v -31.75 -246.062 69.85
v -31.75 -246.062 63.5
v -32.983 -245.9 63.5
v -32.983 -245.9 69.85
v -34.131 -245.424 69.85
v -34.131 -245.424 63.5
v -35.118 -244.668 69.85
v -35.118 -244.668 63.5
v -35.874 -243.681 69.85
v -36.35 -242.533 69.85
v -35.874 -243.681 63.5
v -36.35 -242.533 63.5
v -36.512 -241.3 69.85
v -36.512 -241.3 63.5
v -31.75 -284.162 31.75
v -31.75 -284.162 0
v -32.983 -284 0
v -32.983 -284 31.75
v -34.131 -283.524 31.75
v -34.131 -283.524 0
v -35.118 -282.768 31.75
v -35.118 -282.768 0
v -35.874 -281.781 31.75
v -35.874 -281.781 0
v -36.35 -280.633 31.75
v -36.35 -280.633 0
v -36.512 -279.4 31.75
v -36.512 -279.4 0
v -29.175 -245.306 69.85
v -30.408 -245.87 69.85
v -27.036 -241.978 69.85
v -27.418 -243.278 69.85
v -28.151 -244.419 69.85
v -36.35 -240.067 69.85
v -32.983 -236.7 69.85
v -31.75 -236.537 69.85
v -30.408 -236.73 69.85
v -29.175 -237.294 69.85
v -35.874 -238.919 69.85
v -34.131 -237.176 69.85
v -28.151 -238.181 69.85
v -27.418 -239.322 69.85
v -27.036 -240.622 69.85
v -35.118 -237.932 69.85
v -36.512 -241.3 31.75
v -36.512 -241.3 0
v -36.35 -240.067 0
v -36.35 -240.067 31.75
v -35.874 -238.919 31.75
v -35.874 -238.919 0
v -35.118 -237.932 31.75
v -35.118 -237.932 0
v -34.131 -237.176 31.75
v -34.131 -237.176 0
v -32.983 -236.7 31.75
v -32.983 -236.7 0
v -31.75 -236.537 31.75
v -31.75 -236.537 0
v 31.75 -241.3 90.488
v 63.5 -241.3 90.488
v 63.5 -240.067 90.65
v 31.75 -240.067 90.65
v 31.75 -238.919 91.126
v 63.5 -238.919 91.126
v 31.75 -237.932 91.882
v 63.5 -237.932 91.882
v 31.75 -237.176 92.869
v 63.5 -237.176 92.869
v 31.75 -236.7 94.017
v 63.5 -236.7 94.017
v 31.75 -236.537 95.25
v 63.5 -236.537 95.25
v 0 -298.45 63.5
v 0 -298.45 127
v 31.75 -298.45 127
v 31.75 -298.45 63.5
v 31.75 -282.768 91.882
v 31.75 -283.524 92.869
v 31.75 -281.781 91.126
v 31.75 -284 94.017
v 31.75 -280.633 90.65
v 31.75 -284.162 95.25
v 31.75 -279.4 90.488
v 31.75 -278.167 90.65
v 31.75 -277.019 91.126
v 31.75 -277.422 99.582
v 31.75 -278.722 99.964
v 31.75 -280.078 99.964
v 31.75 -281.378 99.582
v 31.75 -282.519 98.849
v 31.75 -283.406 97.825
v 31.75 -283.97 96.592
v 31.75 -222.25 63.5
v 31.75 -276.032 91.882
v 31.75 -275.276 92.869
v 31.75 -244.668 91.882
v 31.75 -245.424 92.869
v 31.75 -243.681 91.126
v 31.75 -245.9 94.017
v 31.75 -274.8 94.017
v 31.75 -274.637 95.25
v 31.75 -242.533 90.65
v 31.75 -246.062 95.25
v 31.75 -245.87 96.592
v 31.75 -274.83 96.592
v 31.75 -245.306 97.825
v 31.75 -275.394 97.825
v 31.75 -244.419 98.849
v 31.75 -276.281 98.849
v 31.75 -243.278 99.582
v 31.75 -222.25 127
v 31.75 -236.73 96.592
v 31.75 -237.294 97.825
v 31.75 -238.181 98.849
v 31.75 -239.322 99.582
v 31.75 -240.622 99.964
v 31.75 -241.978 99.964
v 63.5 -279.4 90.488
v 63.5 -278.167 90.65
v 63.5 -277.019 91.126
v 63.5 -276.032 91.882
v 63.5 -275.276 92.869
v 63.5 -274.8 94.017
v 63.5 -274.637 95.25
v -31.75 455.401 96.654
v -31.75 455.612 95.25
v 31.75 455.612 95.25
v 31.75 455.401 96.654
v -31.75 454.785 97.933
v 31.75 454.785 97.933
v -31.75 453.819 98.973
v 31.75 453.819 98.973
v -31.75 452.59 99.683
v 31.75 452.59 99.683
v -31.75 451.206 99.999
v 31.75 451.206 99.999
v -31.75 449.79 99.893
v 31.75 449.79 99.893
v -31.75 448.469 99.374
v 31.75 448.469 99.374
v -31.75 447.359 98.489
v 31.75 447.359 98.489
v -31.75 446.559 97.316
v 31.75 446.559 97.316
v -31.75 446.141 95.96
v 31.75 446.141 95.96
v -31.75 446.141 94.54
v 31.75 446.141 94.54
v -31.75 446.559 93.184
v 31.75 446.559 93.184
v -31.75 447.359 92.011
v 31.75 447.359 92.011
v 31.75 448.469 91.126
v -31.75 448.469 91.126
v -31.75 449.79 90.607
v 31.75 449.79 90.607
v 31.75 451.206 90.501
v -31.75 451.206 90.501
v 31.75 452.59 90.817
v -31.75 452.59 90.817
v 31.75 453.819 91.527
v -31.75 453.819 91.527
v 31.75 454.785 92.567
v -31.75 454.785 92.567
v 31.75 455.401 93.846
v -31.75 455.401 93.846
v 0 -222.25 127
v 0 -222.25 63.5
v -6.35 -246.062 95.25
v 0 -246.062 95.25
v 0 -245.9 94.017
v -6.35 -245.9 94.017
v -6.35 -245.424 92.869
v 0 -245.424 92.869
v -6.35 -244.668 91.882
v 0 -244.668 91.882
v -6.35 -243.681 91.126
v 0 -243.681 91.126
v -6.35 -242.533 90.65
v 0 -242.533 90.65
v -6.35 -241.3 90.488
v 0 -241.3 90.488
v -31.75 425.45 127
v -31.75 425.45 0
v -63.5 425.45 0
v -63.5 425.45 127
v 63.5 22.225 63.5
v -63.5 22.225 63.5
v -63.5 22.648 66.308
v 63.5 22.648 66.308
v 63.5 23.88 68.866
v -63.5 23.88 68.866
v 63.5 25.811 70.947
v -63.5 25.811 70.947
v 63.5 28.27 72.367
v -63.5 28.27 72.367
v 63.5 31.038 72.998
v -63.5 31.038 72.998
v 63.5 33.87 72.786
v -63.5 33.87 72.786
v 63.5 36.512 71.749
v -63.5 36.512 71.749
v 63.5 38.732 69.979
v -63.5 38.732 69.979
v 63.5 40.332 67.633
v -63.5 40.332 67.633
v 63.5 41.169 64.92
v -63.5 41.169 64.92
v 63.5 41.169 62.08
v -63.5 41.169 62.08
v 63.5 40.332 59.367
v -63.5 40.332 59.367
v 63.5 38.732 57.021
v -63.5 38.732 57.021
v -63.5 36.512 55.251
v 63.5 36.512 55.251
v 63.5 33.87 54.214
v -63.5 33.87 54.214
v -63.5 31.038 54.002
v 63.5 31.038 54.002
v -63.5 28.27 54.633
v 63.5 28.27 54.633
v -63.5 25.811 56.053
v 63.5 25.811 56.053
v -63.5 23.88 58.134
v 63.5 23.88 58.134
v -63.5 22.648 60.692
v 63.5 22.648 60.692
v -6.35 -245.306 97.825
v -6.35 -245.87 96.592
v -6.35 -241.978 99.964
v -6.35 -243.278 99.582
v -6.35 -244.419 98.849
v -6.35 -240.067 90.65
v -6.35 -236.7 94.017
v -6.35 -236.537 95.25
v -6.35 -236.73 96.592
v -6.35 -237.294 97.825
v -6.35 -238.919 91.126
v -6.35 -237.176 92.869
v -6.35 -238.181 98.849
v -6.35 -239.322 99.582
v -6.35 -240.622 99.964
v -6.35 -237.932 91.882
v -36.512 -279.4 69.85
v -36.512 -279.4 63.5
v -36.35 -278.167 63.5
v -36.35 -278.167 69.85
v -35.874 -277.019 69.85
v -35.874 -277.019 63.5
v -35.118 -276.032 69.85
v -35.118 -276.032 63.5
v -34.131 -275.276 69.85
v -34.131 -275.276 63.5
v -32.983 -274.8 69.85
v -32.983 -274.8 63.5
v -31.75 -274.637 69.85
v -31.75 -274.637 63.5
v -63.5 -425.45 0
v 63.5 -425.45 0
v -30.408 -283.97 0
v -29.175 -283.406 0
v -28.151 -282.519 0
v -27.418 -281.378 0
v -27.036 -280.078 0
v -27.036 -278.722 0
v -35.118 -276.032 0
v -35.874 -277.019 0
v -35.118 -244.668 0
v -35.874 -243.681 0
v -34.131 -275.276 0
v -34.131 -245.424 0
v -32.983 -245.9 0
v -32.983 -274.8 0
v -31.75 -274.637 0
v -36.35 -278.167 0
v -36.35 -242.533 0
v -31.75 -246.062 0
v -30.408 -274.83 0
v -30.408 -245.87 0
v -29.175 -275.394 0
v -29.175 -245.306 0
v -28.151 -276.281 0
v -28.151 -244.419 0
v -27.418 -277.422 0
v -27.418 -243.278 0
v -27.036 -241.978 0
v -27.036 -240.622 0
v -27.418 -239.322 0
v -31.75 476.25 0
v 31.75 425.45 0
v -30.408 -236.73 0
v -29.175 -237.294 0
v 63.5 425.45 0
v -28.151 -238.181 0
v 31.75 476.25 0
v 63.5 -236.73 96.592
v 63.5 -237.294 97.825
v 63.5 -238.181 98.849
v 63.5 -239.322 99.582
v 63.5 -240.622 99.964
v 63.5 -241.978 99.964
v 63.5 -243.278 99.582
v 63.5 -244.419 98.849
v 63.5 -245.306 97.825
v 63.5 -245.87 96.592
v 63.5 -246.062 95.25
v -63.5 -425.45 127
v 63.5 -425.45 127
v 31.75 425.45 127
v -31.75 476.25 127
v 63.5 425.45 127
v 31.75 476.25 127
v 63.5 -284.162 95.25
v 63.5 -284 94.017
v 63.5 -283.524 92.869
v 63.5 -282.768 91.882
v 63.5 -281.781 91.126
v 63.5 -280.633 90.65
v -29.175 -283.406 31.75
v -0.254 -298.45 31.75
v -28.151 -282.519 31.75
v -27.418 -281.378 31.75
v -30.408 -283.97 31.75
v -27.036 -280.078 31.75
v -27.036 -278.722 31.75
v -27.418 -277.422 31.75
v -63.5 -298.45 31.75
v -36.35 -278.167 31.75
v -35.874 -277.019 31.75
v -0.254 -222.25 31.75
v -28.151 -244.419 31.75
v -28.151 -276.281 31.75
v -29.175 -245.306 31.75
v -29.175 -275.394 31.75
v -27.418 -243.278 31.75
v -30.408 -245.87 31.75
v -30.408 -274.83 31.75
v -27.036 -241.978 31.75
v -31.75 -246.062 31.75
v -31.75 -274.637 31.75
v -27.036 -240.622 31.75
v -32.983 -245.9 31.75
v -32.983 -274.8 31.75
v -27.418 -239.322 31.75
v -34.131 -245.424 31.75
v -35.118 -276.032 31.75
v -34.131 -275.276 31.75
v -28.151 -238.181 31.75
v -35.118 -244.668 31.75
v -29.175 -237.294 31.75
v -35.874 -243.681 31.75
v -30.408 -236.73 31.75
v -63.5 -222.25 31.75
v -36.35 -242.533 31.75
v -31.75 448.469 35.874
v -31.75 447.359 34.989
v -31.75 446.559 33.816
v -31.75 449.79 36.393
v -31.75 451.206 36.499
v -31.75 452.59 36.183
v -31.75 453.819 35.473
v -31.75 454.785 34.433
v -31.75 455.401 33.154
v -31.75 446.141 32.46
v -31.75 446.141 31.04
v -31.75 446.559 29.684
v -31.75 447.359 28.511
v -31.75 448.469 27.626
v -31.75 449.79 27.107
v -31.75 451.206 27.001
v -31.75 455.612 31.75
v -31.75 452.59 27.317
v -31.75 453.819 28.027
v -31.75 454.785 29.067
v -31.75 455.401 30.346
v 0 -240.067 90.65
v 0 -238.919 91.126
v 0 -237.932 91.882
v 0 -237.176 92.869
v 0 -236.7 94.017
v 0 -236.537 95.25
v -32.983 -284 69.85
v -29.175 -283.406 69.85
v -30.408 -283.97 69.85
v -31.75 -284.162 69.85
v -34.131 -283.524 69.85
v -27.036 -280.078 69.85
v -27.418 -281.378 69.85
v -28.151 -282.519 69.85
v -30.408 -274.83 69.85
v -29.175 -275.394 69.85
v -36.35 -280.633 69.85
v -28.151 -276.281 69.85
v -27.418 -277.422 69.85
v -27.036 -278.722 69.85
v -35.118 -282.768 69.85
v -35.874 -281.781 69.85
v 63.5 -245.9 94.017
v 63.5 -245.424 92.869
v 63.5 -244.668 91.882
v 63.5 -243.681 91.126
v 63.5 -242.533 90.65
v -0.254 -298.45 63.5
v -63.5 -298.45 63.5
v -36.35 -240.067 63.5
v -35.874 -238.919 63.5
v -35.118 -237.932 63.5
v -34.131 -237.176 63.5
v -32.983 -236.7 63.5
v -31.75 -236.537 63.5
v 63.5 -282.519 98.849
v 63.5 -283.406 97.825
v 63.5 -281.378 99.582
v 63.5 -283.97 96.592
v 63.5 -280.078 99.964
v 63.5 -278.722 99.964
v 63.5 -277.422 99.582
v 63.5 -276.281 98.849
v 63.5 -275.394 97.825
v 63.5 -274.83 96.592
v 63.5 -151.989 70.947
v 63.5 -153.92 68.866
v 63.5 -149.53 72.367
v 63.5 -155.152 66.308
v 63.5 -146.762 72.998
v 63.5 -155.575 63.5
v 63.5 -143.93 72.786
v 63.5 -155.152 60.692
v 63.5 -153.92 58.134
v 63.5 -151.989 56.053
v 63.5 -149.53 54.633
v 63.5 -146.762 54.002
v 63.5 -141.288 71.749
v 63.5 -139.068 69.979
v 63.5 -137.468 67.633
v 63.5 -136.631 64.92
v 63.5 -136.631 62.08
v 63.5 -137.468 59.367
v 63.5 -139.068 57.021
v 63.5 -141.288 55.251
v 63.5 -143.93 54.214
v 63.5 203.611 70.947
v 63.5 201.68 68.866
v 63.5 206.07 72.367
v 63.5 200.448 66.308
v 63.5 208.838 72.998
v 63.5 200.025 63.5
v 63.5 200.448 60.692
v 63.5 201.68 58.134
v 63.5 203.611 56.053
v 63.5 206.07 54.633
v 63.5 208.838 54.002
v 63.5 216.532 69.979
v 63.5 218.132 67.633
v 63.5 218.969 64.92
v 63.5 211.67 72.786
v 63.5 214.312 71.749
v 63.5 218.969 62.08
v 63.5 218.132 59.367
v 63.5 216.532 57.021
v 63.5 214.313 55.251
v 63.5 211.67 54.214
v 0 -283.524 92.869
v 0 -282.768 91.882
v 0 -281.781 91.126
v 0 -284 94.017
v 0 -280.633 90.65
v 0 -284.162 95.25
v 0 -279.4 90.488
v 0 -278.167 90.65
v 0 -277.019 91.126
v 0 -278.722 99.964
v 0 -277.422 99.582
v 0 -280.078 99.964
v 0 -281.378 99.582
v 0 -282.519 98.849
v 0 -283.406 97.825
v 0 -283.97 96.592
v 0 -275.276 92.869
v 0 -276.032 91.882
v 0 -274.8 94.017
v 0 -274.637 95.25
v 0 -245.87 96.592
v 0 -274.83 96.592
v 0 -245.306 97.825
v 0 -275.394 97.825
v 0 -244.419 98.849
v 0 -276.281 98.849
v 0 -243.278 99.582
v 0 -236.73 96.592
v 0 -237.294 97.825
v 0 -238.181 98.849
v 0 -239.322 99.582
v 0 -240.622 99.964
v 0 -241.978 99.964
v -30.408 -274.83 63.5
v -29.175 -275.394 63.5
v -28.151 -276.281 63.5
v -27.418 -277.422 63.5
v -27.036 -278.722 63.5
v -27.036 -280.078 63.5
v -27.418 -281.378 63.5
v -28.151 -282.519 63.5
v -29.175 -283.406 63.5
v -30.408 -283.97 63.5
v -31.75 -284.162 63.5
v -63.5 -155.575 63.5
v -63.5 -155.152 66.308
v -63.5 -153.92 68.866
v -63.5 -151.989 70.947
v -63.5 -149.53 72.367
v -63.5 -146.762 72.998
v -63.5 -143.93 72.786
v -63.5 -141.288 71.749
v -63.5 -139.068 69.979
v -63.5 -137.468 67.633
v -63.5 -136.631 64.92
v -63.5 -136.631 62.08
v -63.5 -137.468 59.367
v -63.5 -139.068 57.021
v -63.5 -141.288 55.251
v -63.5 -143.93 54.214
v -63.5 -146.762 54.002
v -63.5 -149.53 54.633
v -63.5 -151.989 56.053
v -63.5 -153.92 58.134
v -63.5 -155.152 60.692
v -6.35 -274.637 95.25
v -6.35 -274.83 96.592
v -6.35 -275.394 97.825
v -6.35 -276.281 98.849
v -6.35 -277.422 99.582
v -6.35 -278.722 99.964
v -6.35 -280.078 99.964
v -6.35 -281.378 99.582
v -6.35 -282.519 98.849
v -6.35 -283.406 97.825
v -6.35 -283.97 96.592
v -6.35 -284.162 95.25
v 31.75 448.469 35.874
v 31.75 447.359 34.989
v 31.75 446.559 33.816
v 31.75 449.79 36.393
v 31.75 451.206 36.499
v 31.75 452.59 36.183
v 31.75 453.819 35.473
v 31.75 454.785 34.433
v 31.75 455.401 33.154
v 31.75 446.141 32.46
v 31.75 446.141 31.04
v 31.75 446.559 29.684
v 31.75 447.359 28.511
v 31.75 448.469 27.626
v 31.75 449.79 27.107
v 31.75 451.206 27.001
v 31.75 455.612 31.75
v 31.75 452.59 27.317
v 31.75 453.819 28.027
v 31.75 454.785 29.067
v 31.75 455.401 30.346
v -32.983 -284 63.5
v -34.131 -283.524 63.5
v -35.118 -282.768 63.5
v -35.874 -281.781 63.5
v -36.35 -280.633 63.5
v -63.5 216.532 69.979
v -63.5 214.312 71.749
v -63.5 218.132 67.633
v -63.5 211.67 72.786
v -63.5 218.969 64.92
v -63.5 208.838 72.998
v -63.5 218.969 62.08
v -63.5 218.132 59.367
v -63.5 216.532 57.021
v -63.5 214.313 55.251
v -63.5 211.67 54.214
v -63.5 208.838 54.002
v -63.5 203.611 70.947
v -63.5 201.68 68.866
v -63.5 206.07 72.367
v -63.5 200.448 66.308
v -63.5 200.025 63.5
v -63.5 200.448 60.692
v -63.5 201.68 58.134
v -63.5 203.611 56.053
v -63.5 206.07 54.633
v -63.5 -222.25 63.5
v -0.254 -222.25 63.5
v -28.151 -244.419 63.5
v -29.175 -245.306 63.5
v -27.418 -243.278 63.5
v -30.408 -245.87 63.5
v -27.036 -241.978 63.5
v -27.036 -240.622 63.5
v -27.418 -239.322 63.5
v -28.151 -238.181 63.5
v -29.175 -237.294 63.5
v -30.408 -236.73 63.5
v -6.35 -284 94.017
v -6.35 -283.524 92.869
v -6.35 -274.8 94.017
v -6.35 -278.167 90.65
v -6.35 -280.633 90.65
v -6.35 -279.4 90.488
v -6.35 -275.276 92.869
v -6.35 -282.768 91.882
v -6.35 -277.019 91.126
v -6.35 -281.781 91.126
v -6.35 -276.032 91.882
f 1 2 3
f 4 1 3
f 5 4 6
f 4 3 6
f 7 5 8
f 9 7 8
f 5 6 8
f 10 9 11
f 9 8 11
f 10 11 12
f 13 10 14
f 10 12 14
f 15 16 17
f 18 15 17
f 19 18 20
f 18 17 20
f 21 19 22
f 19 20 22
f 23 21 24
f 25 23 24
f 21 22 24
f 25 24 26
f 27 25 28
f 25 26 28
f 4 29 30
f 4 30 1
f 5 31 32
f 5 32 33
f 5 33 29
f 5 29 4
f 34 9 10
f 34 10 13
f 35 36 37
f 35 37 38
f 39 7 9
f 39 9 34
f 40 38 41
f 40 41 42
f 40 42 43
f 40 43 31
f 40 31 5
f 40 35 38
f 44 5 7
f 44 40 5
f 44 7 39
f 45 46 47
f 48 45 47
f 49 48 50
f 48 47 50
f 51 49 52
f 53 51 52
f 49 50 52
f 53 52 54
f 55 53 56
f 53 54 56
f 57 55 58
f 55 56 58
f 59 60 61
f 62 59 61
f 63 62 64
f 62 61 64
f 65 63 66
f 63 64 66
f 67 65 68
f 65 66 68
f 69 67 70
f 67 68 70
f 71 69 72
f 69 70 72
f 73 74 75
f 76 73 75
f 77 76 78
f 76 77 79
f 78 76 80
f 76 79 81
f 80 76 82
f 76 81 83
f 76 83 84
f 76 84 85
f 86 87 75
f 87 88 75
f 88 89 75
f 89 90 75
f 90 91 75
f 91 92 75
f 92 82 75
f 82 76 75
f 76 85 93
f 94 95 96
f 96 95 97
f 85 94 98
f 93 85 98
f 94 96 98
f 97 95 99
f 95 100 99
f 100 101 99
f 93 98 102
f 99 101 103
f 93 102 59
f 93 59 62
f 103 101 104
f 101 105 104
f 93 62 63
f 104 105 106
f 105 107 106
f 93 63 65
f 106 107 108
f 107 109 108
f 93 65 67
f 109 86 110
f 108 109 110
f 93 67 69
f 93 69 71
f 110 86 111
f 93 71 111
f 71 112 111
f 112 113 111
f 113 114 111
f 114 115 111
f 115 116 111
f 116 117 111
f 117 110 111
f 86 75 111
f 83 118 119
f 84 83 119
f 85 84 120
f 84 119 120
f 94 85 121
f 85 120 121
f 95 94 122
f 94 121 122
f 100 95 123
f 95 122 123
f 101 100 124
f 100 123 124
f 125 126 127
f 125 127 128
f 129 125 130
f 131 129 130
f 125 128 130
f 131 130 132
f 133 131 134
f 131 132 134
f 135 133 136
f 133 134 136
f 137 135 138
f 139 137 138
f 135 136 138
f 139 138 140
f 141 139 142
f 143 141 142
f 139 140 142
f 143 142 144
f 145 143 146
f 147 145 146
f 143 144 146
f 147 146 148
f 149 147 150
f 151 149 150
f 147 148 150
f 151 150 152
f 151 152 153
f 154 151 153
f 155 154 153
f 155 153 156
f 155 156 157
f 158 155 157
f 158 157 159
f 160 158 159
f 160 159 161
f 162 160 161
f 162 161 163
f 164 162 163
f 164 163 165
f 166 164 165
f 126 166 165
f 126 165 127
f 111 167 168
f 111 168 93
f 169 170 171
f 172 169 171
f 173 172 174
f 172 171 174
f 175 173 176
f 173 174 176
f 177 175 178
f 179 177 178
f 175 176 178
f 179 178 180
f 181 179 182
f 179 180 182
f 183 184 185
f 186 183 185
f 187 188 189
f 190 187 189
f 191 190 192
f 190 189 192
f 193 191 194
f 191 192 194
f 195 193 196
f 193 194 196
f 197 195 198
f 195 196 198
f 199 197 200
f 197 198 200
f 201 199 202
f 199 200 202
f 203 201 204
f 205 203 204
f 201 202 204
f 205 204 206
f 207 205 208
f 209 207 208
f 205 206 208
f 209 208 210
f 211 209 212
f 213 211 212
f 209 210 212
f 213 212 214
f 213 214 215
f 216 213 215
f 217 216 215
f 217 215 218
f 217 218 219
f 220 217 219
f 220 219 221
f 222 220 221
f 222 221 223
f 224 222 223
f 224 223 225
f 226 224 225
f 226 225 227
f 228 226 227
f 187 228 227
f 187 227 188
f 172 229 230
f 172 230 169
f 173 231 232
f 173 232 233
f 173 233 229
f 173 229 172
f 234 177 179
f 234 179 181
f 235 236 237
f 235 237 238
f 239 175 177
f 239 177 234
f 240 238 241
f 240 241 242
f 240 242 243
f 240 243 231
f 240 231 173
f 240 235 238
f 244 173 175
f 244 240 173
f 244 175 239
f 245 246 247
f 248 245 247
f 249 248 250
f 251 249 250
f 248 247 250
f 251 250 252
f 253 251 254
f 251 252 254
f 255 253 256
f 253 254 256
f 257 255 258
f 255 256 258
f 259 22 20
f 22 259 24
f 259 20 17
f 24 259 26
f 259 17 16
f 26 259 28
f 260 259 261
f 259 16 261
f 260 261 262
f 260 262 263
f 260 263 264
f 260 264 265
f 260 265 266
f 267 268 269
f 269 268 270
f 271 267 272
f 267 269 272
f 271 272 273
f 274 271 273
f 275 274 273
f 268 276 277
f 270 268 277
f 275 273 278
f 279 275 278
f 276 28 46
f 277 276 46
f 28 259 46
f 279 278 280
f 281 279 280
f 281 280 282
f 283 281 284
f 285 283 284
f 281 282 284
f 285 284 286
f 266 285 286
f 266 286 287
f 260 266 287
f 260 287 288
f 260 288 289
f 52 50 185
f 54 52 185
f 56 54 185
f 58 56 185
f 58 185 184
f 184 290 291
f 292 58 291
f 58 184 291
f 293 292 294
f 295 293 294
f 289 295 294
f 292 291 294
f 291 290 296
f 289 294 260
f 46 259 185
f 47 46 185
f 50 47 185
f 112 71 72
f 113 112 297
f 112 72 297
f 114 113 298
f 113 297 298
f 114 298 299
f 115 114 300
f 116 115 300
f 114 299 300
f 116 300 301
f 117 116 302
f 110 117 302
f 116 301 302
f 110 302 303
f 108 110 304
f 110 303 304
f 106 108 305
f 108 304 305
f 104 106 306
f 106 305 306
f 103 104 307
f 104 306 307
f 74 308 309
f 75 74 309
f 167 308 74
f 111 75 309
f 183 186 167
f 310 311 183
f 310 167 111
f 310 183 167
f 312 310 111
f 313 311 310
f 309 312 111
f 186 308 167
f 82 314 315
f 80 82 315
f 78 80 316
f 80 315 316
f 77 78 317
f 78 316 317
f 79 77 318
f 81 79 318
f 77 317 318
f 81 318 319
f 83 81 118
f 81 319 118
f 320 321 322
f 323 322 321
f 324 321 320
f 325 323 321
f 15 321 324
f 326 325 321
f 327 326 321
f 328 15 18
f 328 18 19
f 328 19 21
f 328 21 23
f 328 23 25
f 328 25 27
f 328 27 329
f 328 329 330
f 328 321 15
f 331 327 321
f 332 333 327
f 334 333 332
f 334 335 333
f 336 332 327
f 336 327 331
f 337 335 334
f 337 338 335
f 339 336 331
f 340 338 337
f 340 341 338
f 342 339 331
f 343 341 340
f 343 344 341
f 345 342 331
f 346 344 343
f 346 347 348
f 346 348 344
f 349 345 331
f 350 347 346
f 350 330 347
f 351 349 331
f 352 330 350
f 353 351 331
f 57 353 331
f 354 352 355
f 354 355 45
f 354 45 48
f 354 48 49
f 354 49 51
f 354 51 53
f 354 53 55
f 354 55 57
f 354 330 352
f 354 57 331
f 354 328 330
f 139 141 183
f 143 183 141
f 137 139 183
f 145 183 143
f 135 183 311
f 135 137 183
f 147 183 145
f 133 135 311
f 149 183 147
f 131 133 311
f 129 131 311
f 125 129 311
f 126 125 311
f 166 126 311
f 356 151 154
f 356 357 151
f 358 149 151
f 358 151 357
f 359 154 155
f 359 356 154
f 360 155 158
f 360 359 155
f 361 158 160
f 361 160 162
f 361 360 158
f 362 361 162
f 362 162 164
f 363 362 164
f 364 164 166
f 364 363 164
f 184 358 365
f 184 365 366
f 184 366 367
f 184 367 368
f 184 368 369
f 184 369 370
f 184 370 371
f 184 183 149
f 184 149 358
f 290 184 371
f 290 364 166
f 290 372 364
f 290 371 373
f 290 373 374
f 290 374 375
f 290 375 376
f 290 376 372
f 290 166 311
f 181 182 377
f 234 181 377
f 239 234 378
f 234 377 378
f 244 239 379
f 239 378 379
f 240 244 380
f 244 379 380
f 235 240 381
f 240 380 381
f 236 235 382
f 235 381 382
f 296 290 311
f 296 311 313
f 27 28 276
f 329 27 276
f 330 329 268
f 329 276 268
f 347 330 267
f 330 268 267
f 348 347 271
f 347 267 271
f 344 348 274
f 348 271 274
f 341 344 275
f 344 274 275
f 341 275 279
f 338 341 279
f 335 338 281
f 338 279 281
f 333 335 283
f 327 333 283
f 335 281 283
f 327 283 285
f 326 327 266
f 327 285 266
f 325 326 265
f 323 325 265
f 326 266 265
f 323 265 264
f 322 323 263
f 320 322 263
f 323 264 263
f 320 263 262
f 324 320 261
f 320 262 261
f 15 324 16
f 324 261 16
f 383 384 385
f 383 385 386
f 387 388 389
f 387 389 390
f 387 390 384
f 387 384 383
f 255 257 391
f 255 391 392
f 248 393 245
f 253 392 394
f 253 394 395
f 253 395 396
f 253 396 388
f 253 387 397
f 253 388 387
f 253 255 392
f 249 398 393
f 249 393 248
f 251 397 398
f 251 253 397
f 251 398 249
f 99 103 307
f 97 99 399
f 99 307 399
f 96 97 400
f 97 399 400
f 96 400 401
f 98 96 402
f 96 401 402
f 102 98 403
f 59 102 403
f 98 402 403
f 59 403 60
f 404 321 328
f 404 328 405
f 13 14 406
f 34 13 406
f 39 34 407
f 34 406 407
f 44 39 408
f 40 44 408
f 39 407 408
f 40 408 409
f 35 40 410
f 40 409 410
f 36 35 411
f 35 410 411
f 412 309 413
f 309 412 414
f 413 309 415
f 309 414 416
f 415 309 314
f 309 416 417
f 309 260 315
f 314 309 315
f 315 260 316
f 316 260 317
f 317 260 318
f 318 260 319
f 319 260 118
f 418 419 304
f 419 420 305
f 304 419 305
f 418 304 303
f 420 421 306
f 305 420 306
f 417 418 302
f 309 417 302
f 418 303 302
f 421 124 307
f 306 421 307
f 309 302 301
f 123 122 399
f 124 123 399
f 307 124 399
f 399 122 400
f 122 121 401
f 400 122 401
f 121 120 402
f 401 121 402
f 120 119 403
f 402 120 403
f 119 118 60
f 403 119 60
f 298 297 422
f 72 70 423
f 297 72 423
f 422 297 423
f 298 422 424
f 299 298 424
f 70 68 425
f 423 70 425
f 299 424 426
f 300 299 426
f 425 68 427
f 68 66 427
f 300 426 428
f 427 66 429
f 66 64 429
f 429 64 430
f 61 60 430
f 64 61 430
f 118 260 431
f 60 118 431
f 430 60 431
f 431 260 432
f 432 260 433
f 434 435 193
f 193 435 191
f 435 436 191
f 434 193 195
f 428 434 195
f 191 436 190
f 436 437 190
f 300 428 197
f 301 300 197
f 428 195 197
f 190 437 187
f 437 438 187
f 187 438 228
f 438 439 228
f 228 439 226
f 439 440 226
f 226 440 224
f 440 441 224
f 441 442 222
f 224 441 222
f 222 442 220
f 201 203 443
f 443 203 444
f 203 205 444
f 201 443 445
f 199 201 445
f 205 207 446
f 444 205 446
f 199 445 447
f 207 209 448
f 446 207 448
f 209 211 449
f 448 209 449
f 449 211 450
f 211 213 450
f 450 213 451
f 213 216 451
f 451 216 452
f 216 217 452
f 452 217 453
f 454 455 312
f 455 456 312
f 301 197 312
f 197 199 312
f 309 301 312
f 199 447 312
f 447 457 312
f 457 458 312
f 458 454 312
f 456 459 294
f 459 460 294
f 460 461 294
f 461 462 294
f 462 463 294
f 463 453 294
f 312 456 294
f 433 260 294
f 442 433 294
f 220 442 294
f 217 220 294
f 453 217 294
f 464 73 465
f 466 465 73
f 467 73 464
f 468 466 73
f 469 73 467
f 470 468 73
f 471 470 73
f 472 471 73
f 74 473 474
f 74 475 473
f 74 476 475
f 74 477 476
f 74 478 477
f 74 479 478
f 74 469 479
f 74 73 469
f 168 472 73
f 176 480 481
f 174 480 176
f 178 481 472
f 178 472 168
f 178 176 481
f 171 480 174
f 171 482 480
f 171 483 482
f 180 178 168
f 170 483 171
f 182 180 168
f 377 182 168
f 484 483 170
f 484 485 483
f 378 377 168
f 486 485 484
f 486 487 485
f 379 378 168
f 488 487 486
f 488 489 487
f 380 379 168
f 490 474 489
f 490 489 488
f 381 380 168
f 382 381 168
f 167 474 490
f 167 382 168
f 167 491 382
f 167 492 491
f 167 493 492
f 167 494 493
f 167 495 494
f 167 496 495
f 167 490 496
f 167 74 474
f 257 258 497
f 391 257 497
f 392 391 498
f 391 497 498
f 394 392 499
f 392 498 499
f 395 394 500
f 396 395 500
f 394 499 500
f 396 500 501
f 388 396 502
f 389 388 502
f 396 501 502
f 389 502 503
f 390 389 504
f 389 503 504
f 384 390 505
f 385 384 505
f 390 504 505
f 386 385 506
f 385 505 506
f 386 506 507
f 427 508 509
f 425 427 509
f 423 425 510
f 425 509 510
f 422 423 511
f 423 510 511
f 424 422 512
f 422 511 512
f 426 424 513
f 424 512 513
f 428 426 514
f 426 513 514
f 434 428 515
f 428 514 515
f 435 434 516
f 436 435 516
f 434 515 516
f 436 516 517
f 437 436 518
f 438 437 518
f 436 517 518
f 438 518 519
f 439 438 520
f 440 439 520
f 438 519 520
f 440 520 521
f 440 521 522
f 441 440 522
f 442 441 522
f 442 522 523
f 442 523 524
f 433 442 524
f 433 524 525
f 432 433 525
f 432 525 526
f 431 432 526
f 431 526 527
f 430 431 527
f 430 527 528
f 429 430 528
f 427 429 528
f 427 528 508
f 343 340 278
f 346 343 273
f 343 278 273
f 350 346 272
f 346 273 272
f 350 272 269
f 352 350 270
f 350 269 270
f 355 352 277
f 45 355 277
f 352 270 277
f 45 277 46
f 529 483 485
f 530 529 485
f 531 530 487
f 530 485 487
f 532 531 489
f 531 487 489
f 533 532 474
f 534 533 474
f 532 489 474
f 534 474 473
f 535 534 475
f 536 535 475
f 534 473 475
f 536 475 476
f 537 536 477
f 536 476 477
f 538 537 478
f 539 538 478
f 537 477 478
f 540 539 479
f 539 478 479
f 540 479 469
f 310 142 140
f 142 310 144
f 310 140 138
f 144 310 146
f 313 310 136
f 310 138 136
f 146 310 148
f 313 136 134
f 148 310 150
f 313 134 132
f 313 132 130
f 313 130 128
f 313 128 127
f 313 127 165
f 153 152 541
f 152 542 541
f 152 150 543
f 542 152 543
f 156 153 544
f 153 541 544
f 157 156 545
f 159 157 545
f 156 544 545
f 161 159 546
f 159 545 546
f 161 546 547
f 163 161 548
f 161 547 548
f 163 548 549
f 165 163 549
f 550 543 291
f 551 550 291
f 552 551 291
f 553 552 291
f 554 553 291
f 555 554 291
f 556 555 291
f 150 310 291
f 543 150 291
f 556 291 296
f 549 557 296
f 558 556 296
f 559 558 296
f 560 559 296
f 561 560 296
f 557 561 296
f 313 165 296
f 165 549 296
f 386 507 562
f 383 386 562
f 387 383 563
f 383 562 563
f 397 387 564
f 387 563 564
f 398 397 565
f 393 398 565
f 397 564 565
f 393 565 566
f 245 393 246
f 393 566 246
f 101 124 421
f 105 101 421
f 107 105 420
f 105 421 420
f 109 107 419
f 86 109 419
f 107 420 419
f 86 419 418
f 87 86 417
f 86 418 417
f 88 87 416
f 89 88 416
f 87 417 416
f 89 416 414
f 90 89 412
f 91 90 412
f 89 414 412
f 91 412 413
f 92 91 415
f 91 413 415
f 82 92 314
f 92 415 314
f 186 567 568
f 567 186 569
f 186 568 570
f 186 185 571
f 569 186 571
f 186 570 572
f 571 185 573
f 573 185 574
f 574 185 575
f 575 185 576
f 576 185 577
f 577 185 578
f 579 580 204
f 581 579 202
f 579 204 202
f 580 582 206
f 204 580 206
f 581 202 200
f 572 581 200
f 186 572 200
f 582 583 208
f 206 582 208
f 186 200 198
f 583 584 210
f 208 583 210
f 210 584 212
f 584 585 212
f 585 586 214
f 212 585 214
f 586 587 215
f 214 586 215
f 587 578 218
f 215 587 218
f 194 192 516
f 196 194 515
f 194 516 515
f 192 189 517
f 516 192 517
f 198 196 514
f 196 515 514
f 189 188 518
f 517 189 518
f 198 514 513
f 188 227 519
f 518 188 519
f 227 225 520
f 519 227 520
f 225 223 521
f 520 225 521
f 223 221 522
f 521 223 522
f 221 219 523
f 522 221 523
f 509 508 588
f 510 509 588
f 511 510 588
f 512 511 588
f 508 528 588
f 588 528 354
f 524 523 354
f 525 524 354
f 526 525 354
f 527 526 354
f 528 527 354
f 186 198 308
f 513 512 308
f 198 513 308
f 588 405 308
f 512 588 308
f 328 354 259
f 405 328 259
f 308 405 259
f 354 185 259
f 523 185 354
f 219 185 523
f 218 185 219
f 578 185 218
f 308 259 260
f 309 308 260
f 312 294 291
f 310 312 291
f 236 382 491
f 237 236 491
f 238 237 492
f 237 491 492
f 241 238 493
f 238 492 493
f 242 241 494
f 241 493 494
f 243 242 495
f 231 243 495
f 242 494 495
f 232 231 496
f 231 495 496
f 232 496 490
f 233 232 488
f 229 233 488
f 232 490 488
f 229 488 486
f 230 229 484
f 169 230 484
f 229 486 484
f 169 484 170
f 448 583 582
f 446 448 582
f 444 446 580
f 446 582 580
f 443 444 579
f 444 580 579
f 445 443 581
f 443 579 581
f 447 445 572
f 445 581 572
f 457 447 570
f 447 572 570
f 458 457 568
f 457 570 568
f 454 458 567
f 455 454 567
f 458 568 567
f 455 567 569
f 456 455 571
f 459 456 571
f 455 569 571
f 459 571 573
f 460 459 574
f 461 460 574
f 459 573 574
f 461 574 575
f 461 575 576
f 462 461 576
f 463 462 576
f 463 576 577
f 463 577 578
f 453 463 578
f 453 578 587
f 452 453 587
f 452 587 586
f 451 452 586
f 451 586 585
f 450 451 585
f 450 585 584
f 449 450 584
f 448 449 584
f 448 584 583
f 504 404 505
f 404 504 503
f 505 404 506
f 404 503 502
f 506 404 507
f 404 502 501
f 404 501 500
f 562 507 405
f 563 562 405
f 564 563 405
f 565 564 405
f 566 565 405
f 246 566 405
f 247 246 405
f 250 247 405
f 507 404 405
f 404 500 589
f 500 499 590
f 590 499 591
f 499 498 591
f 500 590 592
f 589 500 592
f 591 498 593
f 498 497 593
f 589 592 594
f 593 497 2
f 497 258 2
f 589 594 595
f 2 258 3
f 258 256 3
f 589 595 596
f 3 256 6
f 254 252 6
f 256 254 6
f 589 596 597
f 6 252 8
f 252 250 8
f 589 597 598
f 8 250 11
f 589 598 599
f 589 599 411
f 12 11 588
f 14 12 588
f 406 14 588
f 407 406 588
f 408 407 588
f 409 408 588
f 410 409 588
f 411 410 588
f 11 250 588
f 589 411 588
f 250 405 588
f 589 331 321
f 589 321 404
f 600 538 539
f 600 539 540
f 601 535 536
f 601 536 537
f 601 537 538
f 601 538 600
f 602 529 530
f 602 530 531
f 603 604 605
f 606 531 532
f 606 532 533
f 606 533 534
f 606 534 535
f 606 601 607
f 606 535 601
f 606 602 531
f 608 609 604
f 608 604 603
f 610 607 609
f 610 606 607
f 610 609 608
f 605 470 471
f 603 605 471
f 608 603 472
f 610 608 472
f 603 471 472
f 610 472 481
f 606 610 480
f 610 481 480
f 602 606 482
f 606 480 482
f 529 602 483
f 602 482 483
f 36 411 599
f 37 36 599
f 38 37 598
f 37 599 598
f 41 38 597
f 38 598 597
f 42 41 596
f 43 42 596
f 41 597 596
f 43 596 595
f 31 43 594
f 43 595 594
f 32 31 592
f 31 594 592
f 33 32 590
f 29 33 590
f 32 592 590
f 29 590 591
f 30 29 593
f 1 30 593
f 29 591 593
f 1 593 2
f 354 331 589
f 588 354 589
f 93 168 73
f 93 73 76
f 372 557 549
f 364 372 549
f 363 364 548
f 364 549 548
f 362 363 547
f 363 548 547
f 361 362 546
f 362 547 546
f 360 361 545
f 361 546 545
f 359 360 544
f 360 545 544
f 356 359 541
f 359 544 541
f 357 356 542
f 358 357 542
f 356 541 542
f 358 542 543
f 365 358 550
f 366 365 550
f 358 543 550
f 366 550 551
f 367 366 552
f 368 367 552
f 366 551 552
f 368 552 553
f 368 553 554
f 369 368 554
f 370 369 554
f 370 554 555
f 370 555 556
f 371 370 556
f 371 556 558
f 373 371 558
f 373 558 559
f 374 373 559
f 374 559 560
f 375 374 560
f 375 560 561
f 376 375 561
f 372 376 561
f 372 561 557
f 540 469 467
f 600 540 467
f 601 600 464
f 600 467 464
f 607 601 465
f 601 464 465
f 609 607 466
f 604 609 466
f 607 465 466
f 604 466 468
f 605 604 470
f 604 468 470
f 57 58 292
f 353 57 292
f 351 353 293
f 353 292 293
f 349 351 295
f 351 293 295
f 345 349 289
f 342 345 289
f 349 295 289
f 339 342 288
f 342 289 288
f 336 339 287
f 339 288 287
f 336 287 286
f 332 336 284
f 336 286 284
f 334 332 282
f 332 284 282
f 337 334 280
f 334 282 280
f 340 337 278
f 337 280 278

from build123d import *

# Parameters (mm, degrees)
SKETCH1_W           = 63.5
SKETCH1_H           = 50.8
BOSS_EXTRUDE1_DEPTH = 127
SKETCH2_W           = 31.75
SKETCH2_H           = 76.2
CUT_EXTRUDE1_DEPTH  = 63.5
SKETCH3_W           = 31.75
SKETCH3_H           = 76.2
CUT_EXTRUDE3_DEPTH  = 63.246
SKETCH4_R           = 9.525
CUT_EXTRUDE4_DEPTH  = 509.991220455
CUT_EXTRUDE5_DEPTH  = 69.85
CUT_EXTRUDE6_DEPTH  = 69.85
SKETCH7_R           = 4.7625
CUT_EXTRUDE7_DEPTH  = 503.011578552


with BuildPart() as part:
    # Sketch1 → Boss-Extrude1 (new body)
    with BuildSketch(Plane.XY):
        Polygon((63.5, -425.45), (63.5, 425.45), (31.75, 425.45), (31.75, 374.65), (-31.75, 374.65), (-31.75, 425.45), (-63.5, 425.45), (-63.5, -425.45), align=None)
        with Locations((0, 400.05)):
            Rectangle(SKETCH1_W, SKETCH1_H)
        with Locations((0, 450.85)):
            Rectangle(SKETCH1_W, SKETCH1_H)
    extrude(amount=BOSS_EXTRUDE1_DEPTH)

    # Sketch2 → Cut-Extrude1 (cut)
    with BuildSketch(Plane.XY.offset(127)):
        with Locations((15.875, -260.35)):
            Rectangle(SKETCH2_W, SKETCH2_H)
    extrude(amount=-CUT_EXTRUDE1_DEPTH, mode=Mode.SUBTRACT)

    # Sketch3 → Cut-Extrude3 (cut)
    with BuildSketch(Plane.ZY.offset(63.5)):
        with Locations((47.625, -260.35)):
            Rectangle(SKETCH3_W, SKETCH3_H)
    extrude(amount=-CUT_EXTRUDE3_DEPTH, mode=Mode.SUBTRACT)

    # Sketch4 → Cut-Extrude4 (cut, through all)
    with BuildSketch(Plane.ZY.offset(63.5)):
        with Locations(Location((63.5, -146.05, 0), (0, 0, 270))):
            Circle(SKETCH4_R)
        with Locations(Location((63.5, 31.75, 0), (0, 0, 270))):
            Circle(SKETCH4_R)
        with Locations(Location((63.5, 209.55, 0), (0, 0, 270))):
            Circle(SKETCH4_R)
    extrude(amount=-CUT_EXTRUDE4_DEPTH, mode=Mode.SUBTRACT)

    # Sketch5 → Cut-Extrude5 (cut)
    with BuildSketch(Plane(origin=(0, 0, 0), x_dir=(-1, 0, 0), z_dir=(0, 0, -1))):
        with BuildLine():
            ThreePointArc((36.5125, -279.4), (35.117596045, -276.032403955), (31.75, -274.6375))
            Line((31.75, -274.6375), (31.75, -284.1625))
            ThreePointArc((31.75, -284.1625), (35.117596045, -282.767596045), (36.5125, -279.4))
        make_face()
        with BuildLine():
            Line((31.75, -284.1625), (31.75, -274.6375))
            ThreePointArc((31.75, -274.6375), (26.9875, -279.4), (31.75, -284.1625))
        make_face()
        with BuildLine():
            ThreePointArc((36.5125, -241.3), (35.117596045, -237.932403955), (31.75, -236.5375))
            Line((31.75, -236.5375), (31.75, -246.0625))
            ThreePointArc((31.75, -246.0625), (35.117596045, -244.667596045), (36.5125, -241.3))
        make_face()
        with BuildLine():
            Line((31.75, -246.0625), (31.75, -236.5375))
            ThreePointArc((31.75, -236.5375), (26.9875, -241.3), (31.75, -246.0625))
        make_face()
    extrude(amount=-CUT_EXTRUDE5_DEPTH, mode=Mode.SUBTRACT)

    # Sketch6 → Cut-Extrude6 (cut)
    with BuildSketch(Plane(origin=(63.5, 0, 0), x_dir=(0, 0, -1), z_dir=(1, 0, 0))):
        with BuildLine():
            ThreePointArc((-90.4875, -241.3), (-91.882403955, -237.932403955), (-95.25, -236.5375))
            Line((-95.25, -236.5375), (-95.25, -246.0625))
            ThreePointArc((-95.25, -246.0625), (-91.882403955, -244.667596045), (-90.4875, -241.3))
        make_face()
        with BuildLine():
            Line((-95.25, -246.0625), (-95.25, -236.5375))
            ThreePointArc((-95.25, -236.5375), (-100.0125, -241.3), (-95.25, -246.0625))
        make_face()
        with BuildLine():
            ThreePointArc((-90.4875, -279.4), (-91.882403955, -276.032403955), (-95.25, -274.6375))
            Line((-95.25, -274.6375), (-95.25, -284.1625))
            ThreePointArc((-95.25, -284.1625), (-91.882403955, -282.767596045), (-90.4875, -279.4))
        make_face()
        with BuildLine():
            Line((-95.25, -284.1625), (-95.25, -274.6375))
            ThreePointArc((-95.25, -274.6375), (-100.0125, -279.4), (-95.25, -284.1625))
        make_face()
    extrude(amount=-CUT_EXTRUDE6_DEPTH, mode=Mode.SUBTRACT)

    # Sketch7 → Cut-Extrude7 (cut, through all)
    with BuildSketch(Plane(origin=(31.75, 0, 0), x_dir=(0, 0, -1), z_dir=(1, 0, 0))):
        with Locations(Location((-95.25, 450.85, 0), (0, 0, 90))):
            Circle(SKETCH7_R)
        with Locations(Location((-31.75, 450.85, 0), (0, 0, 90))):
            Circle(SKETCH7_R)
    extrude(amount=-CUT_EXTRUDE7_DEPTH, mode=Mode.SUBTRACT)


solid = part.part
